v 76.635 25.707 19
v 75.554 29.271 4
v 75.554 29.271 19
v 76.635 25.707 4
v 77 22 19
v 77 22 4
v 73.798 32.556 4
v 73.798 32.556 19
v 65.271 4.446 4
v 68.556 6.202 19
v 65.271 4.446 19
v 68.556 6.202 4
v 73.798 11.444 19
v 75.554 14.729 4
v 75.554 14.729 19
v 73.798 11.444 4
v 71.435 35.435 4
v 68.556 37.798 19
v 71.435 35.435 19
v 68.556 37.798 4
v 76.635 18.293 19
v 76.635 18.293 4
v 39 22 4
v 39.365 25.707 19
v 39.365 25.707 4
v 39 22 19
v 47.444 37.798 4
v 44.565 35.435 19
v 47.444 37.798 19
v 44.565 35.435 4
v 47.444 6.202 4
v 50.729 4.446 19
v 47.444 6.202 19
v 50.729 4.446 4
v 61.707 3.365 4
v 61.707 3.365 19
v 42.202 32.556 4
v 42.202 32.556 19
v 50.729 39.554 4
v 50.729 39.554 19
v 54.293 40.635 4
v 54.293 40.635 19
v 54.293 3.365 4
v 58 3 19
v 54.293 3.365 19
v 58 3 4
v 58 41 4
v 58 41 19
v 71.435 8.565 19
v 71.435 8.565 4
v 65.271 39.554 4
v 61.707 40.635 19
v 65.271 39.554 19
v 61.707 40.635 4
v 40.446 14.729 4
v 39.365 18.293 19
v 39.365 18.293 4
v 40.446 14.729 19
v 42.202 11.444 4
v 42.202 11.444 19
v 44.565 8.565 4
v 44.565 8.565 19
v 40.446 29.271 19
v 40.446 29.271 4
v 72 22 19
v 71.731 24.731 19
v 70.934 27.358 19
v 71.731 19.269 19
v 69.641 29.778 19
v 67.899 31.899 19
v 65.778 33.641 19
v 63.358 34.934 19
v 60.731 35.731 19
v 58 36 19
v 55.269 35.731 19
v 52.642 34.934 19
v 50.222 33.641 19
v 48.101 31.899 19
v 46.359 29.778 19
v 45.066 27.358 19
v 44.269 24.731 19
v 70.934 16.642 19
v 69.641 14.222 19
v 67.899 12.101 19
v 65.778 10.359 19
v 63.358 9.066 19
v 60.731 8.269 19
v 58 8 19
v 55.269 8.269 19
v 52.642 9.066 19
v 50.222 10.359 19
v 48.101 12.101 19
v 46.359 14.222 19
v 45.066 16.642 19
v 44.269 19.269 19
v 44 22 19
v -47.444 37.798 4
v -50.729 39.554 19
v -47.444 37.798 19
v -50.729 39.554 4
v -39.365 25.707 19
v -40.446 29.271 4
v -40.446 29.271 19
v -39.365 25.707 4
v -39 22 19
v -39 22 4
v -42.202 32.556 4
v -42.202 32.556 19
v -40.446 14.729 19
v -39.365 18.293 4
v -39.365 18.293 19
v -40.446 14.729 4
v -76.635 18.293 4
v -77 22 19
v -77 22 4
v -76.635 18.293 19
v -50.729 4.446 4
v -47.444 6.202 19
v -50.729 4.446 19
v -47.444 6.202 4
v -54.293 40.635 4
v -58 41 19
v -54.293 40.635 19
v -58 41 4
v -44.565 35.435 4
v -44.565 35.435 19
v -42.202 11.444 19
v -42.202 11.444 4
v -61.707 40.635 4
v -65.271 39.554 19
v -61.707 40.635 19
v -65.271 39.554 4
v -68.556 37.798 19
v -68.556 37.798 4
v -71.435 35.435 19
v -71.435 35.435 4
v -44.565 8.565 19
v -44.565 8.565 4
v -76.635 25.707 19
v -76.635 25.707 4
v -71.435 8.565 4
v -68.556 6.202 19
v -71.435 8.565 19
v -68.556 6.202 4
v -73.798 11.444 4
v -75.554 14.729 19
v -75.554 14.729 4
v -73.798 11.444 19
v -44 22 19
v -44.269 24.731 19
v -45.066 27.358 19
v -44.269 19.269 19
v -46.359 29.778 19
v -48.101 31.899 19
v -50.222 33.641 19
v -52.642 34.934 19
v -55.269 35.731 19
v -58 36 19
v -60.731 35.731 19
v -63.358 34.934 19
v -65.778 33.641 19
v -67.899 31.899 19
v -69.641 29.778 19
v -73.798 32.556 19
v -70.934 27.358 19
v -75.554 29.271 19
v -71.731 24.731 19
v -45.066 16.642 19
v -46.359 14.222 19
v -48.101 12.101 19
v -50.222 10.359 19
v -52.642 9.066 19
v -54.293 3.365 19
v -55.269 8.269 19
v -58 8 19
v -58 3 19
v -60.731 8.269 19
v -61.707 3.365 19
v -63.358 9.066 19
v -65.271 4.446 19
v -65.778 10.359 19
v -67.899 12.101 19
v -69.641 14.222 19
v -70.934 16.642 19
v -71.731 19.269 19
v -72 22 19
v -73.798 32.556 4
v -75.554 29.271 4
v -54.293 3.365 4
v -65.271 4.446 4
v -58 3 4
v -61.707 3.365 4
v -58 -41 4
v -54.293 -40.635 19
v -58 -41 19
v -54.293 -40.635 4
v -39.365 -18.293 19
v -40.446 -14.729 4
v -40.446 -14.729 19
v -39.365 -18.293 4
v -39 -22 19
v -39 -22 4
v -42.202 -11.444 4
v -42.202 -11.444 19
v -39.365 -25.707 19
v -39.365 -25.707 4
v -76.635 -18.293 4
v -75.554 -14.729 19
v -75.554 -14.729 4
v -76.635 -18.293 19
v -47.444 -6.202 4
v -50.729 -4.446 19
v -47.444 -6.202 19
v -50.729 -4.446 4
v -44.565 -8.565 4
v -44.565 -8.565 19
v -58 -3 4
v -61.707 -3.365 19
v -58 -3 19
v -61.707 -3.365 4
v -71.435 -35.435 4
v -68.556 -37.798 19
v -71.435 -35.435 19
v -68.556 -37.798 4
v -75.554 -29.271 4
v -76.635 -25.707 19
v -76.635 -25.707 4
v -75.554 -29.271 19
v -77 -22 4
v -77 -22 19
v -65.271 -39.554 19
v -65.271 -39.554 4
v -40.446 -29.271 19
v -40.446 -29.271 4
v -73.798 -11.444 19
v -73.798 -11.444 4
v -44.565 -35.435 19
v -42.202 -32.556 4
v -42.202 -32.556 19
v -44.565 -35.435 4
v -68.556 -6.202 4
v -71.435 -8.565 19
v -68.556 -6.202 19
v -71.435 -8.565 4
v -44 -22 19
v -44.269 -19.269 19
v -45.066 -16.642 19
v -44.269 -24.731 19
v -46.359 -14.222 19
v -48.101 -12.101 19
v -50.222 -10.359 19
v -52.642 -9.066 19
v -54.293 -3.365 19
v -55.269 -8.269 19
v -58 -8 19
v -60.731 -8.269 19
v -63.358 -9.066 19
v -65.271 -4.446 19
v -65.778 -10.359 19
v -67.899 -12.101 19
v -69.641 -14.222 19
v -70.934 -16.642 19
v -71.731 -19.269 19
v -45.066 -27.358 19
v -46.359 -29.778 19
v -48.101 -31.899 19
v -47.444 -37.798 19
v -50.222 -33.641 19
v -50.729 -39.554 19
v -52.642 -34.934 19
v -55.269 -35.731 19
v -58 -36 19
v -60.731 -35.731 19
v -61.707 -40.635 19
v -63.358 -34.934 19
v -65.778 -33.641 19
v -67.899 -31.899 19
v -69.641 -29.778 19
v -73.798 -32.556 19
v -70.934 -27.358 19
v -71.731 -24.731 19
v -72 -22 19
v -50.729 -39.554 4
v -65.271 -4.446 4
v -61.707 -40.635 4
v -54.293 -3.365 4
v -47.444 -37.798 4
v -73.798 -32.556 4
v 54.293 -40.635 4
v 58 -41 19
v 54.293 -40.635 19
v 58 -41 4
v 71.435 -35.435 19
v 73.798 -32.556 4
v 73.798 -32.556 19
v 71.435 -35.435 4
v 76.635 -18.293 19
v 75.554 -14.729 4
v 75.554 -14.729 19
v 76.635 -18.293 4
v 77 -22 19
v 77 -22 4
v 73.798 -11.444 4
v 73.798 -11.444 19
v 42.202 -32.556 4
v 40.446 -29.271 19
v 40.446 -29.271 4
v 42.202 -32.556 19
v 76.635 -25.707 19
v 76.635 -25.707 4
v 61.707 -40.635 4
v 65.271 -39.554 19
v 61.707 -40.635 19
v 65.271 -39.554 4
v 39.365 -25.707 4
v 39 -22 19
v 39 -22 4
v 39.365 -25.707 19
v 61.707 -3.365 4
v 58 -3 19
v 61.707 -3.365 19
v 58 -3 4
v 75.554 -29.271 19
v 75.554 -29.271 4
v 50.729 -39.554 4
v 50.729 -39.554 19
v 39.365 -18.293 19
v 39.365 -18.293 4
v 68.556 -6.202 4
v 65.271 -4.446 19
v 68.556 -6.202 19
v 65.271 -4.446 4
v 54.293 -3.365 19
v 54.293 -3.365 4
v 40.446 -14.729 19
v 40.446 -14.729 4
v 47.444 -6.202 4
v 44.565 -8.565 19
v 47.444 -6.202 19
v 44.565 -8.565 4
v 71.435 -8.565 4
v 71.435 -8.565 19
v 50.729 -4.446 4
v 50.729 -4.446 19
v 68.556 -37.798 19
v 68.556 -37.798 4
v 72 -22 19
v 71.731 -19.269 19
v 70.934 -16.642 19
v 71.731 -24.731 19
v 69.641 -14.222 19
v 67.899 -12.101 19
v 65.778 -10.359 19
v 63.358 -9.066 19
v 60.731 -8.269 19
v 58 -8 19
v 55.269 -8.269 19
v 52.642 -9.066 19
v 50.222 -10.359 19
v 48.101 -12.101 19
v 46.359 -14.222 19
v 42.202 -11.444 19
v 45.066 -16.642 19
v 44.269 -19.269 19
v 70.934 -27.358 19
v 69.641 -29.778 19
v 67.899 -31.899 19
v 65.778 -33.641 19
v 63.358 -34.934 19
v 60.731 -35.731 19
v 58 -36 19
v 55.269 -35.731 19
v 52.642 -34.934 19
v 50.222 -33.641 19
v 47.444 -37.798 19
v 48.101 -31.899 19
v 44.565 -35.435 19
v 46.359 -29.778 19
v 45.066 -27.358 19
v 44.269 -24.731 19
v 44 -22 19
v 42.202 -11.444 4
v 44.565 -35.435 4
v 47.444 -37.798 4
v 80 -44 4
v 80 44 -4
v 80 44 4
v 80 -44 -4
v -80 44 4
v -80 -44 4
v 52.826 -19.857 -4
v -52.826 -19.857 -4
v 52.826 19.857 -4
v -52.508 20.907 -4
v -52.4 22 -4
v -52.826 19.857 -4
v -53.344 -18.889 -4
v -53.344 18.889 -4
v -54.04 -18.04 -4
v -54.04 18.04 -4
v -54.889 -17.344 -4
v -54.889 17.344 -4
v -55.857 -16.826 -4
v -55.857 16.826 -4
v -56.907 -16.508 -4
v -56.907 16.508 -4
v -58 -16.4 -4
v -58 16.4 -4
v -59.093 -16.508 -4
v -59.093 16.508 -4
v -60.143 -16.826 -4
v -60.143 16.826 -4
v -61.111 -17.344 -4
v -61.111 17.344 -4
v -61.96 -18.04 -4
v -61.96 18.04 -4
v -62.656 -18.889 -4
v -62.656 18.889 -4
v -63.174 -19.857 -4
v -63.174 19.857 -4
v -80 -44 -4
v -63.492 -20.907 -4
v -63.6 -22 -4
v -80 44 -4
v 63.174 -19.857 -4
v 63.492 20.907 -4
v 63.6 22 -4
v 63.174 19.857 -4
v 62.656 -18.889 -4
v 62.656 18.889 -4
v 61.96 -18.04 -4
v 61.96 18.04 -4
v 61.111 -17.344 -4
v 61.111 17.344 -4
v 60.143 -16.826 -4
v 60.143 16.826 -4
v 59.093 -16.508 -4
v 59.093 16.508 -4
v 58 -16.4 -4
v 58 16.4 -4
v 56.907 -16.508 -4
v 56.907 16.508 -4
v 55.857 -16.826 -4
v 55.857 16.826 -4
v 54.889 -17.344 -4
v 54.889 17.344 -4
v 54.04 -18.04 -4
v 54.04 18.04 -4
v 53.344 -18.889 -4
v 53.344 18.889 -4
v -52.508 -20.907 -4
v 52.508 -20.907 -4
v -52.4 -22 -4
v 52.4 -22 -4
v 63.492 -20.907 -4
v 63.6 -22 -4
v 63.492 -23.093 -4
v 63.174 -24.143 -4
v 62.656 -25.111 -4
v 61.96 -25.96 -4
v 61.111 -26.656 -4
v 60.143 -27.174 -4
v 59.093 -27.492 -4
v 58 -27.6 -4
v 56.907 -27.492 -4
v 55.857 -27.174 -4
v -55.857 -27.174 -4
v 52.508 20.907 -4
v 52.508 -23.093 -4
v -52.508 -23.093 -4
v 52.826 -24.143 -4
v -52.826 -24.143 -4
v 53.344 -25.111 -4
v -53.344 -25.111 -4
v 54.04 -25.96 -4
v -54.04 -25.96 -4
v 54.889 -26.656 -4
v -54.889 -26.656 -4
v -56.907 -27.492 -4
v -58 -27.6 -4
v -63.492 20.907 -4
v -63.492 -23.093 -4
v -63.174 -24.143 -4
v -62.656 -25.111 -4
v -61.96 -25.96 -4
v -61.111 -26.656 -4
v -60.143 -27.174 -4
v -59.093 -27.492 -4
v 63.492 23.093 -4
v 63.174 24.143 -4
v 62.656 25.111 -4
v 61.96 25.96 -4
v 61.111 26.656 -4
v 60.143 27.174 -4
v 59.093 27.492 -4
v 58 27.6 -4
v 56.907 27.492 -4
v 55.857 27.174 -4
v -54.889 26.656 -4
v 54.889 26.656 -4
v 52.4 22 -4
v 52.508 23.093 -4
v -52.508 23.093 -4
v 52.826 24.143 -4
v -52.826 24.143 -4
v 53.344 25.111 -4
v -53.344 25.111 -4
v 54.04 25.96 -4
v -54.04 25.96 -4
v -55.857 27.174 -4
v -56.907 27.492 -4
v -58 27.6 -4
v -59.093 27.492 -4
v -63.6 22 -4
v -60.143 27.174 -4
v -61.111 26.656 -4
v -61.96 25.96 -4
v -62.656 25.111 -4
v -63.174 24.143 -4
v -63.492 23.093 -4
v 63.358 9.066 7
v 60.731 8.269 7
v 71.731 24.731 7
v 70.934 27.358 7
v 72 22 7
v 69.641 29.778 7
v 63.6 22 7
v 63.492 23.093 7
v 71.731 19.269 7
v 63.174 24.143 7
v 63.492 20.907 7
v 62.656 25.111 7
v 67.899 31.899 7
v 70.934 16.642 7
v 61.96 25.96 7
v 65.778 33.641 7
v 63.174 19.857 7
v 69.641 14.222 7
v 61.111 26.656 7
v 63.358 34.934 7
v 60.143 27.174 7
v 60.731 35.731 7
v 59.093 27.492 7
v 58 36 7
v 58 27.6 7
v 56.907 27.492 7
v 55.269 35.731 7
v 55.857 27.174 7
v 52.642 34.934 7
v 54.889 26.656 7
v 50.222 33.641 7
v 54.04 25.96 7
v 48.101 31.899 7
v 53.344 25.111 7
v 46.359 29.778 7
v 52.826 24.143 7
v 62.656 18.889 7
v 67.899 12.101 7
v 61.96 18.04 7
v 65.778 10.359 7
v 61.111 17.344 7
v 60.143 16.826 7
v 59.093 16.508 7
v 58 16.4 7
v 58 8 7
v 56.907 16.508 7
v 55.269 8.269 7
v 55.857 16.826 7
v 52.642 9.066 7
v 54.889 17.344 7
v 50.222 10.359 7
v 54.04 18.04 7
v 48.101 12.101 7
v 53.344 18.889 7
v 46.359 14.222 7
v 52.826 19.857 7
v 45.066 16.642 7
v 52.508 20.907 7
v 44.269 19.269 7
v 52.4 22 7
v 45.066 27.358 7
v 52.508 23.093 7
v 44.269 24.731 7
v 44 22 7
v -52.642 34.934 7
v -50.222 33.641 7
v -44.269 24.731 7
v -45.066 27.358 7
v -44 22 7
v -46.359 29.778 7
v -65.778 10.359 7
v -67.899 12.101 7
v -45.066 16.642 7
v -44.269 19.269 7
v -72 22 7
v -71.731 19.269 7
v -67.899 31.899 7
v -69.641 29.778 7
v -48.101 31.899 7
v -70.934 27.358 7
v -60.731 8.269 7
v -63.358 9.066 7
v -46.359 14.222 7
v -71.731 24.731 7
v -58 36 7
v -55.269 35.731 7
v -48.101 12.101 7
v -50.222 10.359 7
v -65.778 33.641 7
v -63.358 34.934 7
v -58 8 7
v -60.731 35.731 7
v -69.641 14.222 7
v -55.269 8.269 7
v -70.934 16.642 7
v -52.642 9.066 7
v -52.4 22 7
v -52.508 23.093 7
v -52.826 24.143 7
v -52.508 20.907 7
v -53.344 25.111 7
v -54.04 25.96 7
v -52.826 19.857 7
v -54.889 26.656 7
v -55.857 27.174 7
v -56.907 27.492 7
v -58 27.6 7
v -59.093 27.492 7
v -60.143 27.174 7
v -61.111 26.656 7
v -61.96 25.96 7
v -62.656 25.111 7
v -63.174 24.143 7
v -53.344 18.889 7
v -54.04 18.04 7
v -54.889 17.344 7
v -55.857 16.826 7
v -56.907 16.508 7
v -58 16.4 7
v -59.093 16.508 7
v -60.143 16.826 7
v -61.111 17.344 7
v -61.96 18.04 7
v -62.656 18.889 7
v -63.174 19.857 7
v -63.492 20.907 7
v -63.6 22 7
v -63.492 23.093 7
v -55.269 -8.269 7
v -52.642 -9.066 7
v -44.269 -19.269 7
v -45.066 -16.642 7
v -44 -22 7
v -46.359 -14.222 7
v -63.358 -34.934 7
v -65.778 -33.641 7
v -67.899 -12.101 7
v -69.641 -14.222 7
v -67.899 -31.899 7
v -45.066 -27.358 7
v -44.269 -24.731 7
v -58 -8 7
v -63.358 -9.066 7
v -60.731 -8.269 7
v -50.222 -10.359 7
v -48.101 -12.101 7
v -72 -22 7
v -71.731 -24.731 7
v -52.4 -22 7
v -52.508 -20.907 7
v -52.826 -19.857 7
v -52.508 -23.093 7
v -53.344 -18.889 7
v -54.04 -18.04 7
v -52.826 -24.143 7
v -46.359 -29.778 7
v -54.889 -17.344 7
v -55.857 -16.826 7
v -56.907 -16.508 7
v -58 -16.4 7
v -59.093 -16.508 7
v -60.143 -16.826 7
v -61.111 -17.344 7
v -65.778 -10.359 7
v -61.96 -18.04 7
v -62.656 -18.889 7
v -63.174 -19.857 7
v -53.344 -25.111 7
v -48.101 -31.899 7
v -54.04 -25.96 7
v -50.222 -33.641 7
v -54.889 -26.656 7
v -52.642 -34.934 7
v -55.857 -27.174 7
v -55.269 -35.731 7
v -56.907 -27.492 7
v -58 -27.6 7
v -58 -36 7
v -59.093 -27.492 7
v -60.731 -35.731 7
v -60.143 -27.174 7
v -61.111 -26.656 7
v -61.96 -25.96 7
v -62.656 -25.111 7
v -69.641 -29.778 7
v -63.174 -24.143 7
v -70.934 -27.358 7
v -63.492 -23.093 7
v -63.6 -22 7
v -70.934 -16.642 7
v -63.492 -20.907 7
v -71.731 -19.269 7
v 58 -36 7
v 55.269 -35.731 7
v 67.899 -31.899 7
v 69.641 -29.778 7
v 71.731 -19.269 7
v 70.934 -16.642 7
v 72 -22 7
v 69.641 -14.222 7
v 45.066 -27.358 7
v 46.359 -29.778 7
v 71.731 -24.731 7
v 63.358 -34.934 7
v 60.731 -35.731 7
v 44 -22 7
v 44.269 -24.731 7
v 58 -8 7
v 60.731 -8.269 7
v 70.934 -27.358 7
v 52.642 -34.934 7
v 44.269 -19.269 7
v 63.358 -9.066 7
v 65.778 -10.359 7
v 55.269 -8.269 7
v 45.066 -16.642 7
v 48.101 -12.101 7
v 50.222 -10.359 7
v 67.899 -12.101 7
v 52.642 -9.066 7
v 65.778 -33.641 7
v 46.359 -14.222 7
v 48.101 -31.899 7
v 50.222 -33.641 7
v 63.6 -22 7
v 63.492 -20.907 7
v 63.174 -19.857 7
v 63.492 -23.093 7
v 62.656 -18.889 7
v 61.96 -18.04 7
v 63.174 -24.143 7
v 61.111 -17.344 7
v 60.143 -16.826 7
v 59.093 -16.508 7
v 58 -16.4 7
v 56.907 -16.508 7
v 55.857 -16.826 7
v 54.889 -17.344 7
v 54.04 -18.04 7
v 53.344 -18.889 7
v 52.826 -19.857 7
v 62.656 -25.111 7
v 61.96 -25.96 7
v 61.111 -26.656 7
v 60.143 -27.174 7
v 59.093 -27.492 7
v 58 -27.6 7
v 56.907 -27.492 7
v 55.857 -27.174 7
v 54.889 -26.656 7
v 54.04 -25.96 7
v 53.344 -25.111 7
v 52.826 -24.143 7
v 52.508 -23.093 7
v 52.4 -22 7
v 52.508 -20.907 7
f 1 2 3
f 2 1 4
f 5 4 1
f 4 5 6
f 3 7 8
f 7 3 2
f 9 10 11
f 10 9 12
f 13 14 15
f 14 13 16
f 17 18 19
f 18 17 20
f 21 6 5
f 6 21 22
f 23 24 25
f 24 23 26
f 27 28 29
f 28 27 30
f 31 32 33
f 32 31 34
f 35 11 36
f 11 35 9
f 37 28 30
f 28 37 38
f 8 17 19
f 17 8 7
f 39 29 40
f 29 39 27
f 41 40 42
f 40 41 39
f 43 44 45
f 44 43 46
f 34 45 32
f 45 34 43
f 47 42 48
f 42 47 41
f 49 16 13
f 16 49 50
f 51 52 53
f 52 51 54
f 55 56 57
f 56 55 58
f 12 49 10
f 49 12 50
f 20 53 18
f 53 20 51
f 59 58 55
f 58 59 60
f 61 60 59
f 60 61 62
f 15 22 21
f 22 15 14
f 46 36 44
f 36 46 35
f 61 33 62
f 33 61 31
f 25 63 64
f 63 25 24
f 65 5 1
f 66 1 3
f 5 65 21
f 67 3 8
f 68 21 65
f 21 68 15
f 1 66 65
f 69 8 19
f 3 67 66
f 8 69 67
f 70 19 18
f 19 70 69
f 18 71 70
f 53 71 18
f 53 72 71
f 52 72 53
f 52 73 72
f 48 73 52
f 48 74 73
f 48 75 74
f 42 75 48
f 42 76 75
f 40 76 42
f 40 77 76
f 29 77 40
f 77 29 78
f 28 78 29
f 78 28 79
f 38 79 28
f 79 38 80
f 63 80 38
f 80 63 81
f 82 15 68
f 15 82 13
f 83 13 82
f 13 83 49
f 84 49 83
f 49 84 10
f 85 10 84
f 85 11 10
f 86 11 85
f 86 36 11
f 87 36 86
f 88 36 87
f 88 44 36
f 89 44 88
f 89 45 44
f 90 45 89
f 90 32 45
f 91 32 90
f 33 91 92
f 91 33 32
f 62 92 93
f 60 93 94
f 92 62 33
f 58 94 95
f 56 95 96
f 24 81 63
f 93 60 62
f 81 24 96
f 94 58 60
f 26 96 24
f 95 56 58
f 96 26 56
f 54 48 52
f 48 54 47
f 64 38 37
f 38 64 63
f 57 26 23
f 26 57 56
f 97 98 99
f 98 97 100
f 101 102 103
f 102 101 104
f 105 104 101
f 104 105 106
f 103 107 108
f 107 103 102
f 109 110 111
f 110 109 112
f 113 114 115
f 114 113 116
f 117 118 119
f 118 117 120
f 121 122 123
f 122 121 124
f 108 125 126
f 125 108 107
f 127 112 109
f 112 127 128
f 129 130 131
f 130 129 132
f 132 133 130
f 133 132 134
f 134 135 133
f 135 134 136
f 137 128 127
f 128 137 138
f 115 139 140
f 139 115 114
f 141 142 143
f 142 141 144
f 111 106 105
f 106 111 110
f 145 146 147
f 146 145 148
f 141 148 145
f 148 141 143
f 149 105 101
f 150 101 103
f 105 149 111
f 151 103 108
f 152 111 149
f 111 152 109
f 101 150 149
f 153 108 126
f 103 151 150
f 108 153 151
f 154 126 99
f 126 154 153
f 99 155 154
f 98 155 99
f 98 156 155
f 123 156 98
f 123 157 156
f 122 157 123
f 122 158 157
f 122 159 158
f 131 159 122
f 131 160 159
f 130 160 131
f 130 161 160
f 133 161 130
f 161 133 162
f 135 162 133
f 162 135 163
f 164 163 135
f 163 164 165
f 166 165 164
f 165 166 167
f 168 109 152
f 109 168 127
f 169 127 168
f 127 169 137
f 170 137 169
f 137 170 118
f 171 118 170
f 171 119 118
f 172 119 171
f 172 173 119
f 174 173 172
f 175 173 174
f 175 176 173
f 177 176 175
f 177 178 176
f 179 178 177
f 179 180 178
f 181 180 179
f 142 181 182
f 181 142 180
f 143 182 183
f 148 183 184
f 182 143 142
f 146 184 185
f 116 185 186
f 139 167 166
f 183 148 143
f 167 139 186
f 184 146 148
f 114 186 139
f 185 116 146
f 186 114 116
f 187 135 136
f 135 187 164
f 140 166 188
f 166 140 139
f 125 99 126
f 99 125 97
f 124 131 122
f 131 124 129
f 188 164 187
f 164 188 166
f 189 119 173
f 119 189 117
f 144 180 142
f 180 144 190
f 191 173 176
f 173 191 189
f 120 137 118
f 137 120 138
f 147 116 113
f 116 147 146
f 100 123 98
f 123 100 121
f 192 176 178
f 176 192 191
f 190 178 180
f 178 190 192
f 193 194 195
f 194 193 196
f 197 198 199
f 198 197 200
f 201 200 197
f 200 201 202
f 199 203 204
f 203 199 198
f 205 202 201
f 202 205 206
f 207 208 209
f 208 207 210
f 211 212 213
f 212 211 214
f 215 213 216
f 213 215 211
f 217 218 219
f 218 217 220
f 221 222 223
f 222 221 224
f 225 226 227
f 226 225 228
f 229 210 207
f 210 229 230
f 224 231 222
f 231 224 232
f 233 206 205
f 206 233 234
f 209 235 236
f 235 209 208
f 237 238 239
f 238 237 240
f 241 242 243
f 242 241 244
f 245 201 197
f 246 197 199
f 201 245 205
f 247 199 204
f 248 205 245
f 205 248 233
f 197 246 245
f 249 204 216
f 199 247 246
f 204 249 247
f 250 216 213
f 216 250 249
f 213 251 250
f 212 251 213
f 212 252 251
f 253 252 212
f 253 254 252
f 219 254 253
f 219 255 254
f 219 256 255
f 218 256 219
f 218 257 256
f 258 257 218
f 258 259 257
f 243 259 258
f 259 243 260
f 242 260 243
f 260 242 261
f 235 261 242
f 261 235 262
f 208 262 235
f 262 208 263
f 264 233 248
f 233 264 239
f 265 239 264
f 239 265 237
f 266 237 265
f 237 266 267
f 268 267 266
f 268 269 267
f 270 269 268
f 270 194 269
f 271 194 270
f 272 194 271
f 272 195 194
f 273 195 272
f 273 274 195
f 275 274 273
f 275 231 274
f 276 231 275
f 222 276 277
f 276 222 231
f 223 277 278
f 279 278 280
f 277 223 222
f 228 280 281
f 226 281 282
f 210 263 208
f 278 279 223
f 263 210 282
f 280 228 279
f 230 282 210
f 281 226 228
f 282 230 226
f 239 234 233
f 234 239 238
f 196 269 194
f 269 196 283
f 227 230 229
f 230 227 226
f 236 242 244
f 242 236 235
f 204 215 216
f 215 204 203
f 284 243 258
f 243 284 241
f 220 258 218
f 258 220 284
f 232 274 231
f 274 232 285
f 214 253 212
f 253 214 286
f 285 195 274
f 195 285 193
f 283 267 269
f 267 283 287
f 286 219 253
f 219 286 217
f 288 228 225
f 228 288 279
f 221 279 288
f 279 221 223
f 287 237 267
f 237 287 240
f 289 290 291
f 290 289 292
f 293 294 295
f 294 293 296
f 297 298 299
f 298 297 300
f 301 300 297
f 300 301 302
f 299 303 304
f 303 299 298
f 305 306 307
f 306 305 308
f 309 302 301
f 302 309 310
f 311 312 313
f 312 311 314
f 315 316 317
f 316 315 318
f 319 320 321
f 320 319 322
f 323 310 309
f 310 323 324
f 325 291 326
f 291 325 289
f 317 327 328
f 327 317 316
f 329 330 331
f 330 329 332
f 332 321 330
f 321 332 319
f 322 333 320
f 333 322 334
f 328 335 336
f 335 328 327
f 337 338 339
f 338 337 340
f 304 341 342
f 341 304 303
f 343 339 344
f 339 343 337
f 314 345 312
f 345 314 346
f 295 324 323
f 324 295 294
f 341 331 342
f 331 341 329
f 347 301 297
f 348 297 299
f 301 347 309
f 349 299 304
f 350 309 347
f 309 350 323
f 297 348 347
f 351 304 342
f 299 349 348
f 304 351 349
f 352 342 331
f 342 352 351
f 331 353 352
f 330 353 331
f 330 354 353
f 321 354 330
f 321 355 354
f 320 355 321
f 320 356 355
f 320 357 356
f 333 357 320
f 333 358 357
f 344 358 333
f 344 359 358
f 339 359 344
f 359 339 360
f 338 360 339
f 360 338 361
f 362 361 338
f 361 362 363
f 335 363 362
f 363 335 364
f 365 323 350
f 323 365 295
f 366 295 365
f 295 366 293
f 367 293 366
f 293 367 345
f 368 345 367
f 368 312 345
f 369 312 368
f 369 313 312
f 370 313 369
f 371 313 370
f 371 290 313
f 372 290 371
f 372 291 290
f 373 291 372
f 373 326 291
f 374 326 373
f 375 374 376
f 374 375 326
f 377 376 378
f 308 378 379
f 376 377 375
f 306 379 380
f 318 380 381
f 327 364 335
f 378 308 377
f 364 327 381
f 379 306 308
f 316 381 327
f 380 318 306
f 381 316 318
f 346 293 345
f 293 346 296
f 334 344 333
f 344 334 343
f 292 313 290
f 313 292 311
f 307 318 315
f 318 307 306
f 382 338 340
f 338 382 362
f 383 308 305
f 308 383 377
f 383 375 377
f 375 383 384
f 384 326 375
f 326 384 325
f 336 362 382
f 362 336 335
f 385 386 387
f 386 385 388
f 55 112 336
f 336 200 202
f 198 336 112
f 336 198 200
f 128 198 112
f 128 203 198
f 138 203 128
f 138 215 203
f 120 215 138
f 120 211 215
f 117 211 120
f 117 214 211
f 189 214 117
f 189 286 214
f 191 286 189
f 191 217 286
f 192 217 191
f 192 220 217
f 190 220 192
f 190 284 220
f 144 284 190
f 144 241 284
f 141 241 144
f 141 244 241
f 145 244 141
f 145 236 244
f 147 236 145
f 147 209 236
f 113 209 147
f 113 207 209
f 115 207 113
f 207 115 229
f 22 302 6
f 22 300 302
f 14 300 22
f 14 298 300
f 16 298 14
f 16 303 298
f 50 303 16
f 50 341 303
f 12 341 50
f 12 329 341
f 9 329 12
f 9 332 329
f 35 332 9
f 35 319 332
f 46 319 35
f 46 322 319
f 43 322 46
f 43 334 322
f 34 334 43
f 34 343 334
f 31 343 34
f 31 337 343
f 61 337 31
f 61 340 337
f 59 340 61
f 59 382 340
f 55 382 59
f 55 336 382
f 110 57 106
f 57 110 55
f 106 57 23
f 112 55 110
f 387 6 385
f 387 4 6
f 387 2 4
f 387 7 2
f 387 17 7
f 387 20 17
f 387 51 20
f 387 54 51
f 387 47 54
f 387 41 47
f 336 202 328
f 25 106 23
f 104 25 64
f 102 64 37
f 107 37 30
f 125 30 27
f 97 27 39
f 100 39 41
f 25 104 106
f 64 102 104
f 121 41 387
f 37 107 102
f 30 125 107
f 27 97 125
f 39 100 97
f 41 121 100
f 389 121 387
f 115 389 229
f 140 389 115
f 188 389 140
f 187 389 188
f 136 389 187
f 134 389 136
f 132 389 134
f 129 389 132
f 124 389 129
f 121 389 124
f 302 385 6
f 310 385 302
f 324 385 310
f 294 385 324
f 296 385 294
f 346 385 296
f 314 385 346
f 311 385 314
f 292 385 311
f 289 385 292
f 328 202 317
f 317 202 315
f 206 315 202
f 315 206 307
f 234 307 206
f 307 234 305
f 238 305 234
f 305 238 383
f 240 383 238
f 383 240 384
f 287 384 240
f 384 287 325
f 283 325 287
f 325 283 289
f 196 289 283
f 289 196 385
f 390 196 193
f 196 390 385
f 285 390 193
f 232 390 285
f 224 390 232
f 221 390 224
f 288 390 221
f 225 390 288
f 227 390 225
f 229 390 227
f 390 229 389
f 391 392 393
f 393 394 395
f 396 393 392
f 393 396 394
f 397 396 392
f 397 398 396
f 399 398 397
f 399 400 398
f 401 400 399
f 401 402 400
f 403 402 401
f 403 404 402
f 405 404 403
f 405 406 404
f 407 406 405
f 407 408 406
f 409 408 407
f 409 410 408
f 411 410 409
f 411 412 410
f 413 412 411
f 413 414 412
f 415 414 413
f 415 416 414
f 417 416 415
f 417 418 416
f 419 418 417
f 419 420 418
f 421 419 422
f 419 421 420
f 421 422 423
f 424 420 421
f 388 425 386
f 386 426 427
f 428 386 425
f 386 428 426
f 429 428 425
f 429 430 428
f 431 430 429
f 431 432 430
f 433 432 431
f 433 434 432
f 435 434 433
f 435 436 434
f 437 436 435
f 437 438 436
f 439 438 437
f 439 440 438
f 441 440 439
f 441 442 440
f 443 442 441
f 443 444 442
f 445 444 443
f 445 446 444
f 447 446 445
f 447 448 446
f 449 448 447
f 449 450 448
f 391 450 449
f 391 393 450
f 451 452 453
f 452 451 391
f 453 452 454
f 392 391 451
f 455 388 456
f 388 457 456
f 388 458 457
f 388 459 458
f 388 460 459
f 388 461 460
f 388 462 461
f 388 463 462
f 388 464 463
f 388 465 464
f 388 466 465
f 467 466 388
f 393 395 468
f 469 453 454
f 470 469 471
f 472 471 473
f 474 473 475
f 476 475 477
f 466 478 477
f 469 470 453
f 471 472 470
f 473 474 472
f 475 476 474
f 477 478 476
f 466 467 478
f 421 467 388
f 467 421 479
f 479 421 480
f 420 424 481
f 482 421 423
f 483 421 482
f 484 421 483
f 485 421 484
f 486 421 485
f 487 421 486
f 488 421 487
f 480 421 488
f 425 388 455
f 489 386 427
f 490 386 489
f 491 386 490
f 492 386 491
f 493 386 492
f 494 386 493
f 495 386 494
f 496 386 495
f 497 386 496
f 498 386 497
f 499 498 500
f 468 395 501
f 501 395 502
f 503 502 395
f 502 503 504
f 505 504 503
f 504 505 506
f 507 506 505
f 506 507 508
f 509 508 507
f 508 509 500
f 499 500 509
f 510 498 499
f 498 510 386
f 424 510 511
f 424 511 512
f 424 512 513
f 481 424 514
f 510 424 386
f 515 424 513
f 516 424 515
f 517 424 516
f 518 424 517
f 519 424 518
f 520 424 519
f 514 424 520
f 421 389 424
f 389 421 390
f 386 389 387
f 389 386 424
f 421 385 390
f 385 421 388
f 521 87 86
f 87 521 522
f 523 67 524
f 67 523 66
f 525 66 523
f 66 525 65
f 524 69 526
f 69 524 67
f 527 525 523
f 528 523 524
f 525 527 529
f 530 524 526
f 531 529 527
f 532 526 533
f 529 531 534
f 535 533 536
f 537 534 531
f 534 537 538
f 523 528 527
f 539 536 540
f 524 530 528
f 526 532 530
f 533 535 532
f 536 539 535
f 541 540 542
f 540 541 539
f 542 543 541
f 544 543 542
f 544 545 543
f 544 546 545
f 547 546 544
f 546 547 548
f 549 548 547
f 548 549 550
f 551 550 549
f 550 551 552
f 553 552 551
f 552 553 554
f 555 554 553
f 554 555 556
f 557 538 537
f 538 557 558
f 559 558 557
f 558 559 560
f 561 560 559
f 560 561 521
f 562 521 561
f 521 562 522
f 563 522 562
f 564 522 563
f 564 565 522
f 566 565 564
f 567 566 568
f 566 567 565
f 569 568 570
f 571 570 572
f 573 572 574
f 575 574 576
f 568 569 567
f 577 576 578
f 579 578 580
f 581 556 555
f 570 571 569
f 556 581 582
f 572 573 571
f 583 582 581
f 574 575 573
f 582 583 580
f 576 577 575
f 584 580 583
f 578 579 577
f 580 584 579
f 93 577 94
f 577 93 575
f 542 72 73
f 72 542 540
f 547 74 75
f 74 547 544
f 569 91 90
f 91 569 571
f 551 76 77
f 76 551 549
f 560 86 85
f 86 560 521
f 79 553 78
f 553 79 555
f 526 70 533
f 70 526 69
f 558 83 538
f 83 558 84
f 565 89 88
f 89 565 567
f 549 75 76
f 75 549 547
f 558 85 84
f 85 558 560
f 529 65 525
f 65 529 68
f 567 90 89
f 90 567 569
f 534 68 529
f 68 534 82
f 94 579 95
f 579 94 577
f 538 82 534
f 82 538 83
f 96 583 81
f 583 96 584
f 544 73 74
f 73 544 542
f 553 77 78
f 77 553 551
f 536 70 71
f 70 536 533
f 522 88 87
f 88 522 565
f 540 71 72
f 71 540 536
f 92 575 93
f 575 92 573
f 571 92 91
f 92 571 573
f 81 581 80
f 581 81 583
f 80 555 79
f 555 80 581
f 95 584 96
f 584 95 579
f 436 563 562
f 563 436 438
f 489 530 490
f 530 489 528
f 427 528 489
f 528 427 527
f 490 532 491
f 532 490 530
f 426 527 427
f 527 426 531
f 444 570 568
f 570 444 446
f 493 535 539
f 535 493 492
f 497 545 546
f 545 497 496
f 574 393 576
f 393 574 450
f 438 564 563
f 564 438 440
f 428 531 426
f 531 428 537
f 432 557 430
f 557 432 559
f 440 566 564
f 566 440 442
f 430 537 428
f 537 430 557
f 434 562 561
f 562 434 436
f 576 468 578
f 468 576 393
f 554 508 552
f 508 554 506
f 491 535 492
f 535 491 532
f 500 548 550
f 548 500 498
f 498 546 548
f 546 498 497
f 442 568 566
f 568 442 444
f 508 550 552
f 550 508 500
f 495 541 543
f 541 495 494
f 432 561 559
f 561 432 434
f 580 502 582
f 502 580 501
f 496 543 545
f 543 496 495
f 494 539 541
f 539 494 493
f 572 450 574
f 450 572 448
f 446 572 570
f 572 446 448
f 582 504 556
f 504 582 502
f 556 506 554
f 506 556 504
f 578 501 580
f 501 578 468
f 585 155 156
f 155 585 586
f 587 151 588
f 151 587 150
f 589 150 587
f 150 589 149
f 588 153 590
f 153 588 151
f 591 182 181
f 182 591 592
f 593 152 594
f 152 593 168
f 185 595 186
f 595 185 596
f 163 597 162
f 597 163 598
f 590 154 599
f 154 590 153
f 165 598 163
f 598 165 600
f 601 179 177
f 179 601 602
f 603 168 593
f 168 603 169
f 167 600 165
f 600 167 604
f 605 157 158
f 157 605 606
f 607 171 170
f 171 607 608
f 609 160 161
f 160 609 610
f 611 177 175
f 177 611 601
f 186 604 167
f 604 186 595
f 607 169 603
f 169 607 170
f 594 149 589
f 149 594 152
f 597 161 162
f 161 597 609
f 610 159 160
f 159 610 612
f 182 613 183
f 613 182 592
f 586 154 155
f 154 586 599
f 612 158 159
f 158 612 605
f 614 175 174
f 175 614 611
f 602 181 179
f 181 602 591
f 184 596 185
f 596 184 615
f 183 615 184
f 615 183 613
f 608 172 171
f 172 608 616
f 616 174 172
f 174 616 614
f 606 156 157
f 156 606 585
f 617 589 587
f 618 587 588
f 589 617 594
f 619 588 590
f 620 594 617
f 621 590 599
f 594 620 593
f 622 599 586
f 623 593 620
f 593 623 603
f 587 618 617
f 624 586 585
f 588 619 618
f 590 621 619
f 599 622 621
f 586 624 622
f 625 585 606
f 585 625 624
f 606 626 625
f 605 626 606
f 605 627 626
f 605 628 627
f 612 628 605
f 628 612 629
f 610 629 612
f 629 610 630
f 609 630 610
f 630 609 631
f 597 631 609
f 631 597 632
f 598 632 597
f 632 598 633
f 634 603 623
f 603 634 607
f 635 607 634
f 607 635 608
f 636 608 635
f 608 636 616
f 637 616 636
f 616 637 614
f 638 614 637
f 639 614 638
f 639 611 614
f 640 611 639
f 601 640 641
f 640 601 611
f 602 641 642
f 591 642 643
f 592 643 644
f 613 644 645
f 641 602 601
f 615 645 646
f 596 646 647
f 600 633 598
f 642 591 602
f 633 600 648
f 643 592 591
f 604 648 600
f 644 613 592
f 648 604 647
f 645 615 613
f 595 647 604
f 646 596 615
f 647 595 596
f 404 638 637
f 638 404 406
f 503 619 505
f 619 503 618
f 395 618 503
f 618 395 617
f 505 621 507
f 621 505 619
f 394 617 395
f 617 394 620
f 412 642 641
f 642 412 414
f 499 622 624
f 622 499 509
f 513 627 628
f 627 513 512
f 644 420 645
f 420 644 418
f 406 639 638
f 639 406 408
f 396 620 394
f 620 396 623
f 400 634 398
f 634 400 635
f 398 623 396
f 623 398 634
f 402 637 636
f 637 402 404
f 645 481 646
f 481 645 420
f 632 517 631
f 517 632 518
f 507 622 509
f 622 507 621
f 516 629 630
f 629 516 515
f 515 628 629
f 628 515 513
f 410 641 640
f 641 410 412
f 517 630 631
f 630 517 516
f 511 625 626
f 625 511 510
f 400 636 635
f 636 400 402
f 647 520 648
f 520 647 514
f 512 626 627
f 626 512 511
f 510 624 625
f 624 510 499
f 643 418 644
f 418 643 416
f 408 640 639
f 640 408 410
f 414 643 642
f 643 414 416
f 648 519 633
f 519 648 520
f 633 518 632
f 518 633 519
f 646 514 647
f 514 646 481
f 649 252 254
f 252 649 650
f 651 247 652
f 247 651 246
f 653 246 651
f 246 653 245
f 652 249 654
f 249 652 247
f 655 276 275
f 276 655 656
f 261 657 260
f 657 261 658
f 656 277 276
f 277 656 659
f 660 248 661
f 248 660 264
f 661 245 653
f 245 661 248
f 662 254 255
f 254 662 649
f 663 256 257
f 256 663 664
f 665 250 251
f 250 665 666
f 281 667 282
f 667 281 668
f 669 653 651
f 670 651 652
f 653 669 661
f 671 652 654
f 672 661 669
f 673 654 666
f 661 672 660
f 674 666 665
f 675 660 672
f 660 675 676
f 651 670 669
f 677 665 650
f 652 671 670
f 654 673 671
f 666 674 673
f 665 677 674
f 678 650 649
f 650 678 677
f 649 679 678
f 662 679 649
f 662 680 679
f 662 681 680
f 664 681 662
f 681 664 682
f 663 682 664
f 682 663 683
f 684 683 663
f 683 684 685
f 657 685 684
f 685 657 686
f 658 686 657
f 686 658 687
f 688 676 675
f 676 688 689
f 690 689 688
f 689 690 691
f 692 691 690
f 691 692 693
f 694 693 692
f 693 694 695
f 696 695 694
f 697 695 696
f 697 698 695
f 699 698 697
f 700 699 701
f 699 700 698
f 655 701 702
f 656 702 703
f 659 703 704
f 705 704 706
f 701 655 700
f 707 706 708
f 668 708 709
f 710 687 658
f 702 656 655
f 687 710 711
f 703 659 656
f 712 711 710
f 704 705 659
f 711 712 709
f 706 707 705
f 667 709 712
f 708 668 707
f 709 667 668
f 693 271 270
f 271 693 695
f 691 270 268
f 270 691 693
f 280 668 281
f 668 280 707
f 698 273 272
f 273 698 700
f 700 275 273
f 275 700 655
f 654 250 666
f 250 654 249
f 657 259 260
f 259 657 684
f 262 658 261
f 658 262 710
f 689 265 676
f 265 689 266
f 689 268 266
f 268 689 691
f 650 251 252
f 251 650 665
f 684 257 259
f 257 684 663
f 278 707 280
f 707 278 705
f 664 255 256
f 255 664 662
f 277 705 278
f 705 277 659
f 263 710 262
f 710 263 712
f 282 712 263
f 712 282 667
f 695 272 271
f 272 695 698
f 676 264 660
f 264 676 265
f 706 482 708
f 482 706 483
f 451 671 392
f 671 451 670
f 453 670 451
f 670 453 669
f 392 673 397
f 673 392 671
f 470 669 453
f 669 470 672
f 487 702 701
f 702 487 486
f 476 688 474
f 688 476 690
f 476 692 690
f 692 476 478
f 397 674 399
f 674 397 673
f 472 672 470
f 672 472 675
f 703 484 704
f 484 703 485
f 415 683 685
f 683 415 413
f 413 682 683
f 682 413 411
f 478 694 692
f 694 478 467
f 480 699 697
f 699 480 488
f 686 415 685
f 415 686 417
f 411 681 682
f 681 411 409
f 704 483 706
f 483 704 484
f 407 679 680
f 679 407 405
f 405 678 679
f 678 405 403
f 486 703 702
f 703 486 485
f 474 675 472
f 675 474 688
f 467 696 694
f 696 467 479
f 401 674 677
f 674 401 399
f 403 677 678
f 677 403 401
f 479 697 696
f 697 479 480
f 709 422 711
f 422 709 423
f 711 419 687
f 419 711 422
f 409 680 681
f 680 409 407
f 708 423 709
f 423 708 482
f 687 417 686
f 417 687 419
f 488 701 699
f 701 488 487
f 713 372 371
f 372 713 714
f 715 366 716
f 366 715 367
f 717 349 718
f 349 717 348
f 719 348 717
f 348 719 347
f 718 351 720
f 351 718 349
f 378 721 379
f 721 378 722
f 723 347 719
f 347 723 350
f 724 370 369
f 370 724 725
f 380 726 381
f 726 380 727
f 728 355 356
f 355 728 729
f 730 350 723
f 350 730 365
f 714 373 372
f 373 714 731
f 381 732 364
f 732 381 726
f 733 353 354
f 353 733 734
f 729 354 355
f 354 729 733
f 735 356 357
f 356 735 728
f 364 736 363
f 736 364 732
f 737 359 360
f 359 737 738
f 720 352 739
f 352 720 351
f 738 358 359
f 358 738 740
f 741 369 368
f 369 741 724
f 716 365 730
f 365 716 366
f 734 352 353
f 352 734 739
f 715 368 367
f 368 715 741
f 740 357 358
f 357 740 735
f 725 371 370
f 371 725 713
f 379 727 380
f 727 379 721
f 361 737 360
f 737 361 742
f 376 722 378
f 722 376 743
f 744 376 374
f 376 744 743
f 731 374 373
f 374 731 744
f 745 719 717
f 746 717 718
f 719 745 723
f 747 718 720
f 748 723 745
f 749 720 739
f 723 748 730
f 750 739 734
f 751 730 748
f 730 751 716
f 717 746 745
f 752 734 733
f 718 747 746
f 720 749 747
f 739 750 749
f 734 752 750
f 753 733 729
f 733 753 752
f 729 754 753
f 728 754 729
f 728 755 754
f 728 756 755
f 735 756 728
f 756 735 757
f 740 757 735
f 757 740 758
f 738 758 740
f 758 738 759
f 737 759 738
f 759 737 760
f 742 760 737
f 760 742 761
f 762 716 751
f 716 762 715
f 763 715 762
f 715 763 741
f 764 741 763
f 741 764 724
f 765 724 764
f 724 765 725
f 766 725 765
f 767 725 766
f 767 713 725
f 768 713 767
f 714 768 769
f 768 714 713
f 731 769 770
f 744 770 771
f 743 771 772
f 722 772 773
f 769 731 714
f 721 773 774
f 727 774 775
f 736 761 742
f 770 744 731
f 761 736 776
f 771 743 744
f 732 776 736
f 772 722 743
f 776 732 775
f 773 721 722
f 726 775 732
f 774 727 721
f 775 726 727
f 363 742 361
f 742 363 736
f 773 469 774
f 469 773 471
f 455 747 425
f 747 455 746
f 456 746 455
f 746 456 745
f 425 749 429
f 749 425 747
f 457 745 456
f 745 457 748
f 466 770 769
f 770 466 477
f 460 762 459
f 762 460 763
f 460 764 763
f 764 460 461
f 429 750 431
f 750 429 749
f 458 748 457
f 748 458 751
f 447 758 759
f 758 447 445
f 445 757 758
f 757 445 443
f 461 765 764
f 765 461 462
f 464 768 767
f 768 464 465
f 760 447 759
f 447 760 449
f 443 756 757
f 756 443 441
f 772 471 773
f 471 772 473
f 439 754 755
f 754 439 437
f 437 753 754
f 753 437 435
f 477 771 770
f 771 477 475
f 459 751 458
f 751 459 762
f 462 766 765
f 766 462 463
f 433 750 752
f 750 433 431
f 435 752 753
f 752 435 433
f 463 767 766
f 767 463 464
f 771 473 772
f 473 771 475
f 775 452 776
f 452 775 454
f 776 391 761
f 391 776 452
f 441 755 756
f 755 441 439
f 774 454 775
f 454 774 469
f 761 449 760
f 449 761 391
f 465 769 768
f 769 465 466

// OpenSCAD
$fn = 32;

// ----------------------------------------------------------------------
// Socket pad plate
// bosses with counterbored sockets for the screws
// ----------------------------------------------------------------------

// --- parameters (mm) ---
base_t = 8;            // base plate thickness
boss_h = 15;           // boss height above the base plate
boss_d = 38;           // boss diameter
socket_d = 28;         // socket diameter
socket_depth = 12;     // socket depth from the boss face
bolt_d = 11.2;         // screw clearance hole through the socket floor
plate = [160, 88, 8];  // overall size (x, y, z)
edge = 22;             // boss centre offset from the plate edge
pads = 4;              // boss count, one per corner

// --- derived feature positions (mm) ---
height = base_t + boss_h;        // = 23   overall height of the part
corner_x = plate[0] / 2 - edge;  // = 58   boss centre X
corner_y = plate[1] / 2 - edge;  // = 22   boss centre Y
feature_centers = [
  [corner_x, corner_y],
  [-corner_x, corner_y],
  [-corner_x, -corner_y],
  [corner_x, -corner_y]
];   // boss centres: sockets, holes and the pads themselves are placed from here

// base plate, bosses on feature_centers, socket + through hole in each
difference() {
  union() {
    cube(plate, center = true);
    for (centre = feature_centers)
      translate([centre[0], centre[1], plate[2] / 2 - 1])
        cylinder(d = boss_d, h = boss_h + 1);
  }
  for (centre = feature_centers) {
    translate([centre[0], centre[1], plate[2] / 2 + boss_h - socket_depth])
      cylinder(d = socket_d, h = socket_depth + 1);
    translate([centre[0], centre[1], -height])
      cylinder(d = bolt_d, h = 2 * height + 2);  // through the socket floor
  }
}
